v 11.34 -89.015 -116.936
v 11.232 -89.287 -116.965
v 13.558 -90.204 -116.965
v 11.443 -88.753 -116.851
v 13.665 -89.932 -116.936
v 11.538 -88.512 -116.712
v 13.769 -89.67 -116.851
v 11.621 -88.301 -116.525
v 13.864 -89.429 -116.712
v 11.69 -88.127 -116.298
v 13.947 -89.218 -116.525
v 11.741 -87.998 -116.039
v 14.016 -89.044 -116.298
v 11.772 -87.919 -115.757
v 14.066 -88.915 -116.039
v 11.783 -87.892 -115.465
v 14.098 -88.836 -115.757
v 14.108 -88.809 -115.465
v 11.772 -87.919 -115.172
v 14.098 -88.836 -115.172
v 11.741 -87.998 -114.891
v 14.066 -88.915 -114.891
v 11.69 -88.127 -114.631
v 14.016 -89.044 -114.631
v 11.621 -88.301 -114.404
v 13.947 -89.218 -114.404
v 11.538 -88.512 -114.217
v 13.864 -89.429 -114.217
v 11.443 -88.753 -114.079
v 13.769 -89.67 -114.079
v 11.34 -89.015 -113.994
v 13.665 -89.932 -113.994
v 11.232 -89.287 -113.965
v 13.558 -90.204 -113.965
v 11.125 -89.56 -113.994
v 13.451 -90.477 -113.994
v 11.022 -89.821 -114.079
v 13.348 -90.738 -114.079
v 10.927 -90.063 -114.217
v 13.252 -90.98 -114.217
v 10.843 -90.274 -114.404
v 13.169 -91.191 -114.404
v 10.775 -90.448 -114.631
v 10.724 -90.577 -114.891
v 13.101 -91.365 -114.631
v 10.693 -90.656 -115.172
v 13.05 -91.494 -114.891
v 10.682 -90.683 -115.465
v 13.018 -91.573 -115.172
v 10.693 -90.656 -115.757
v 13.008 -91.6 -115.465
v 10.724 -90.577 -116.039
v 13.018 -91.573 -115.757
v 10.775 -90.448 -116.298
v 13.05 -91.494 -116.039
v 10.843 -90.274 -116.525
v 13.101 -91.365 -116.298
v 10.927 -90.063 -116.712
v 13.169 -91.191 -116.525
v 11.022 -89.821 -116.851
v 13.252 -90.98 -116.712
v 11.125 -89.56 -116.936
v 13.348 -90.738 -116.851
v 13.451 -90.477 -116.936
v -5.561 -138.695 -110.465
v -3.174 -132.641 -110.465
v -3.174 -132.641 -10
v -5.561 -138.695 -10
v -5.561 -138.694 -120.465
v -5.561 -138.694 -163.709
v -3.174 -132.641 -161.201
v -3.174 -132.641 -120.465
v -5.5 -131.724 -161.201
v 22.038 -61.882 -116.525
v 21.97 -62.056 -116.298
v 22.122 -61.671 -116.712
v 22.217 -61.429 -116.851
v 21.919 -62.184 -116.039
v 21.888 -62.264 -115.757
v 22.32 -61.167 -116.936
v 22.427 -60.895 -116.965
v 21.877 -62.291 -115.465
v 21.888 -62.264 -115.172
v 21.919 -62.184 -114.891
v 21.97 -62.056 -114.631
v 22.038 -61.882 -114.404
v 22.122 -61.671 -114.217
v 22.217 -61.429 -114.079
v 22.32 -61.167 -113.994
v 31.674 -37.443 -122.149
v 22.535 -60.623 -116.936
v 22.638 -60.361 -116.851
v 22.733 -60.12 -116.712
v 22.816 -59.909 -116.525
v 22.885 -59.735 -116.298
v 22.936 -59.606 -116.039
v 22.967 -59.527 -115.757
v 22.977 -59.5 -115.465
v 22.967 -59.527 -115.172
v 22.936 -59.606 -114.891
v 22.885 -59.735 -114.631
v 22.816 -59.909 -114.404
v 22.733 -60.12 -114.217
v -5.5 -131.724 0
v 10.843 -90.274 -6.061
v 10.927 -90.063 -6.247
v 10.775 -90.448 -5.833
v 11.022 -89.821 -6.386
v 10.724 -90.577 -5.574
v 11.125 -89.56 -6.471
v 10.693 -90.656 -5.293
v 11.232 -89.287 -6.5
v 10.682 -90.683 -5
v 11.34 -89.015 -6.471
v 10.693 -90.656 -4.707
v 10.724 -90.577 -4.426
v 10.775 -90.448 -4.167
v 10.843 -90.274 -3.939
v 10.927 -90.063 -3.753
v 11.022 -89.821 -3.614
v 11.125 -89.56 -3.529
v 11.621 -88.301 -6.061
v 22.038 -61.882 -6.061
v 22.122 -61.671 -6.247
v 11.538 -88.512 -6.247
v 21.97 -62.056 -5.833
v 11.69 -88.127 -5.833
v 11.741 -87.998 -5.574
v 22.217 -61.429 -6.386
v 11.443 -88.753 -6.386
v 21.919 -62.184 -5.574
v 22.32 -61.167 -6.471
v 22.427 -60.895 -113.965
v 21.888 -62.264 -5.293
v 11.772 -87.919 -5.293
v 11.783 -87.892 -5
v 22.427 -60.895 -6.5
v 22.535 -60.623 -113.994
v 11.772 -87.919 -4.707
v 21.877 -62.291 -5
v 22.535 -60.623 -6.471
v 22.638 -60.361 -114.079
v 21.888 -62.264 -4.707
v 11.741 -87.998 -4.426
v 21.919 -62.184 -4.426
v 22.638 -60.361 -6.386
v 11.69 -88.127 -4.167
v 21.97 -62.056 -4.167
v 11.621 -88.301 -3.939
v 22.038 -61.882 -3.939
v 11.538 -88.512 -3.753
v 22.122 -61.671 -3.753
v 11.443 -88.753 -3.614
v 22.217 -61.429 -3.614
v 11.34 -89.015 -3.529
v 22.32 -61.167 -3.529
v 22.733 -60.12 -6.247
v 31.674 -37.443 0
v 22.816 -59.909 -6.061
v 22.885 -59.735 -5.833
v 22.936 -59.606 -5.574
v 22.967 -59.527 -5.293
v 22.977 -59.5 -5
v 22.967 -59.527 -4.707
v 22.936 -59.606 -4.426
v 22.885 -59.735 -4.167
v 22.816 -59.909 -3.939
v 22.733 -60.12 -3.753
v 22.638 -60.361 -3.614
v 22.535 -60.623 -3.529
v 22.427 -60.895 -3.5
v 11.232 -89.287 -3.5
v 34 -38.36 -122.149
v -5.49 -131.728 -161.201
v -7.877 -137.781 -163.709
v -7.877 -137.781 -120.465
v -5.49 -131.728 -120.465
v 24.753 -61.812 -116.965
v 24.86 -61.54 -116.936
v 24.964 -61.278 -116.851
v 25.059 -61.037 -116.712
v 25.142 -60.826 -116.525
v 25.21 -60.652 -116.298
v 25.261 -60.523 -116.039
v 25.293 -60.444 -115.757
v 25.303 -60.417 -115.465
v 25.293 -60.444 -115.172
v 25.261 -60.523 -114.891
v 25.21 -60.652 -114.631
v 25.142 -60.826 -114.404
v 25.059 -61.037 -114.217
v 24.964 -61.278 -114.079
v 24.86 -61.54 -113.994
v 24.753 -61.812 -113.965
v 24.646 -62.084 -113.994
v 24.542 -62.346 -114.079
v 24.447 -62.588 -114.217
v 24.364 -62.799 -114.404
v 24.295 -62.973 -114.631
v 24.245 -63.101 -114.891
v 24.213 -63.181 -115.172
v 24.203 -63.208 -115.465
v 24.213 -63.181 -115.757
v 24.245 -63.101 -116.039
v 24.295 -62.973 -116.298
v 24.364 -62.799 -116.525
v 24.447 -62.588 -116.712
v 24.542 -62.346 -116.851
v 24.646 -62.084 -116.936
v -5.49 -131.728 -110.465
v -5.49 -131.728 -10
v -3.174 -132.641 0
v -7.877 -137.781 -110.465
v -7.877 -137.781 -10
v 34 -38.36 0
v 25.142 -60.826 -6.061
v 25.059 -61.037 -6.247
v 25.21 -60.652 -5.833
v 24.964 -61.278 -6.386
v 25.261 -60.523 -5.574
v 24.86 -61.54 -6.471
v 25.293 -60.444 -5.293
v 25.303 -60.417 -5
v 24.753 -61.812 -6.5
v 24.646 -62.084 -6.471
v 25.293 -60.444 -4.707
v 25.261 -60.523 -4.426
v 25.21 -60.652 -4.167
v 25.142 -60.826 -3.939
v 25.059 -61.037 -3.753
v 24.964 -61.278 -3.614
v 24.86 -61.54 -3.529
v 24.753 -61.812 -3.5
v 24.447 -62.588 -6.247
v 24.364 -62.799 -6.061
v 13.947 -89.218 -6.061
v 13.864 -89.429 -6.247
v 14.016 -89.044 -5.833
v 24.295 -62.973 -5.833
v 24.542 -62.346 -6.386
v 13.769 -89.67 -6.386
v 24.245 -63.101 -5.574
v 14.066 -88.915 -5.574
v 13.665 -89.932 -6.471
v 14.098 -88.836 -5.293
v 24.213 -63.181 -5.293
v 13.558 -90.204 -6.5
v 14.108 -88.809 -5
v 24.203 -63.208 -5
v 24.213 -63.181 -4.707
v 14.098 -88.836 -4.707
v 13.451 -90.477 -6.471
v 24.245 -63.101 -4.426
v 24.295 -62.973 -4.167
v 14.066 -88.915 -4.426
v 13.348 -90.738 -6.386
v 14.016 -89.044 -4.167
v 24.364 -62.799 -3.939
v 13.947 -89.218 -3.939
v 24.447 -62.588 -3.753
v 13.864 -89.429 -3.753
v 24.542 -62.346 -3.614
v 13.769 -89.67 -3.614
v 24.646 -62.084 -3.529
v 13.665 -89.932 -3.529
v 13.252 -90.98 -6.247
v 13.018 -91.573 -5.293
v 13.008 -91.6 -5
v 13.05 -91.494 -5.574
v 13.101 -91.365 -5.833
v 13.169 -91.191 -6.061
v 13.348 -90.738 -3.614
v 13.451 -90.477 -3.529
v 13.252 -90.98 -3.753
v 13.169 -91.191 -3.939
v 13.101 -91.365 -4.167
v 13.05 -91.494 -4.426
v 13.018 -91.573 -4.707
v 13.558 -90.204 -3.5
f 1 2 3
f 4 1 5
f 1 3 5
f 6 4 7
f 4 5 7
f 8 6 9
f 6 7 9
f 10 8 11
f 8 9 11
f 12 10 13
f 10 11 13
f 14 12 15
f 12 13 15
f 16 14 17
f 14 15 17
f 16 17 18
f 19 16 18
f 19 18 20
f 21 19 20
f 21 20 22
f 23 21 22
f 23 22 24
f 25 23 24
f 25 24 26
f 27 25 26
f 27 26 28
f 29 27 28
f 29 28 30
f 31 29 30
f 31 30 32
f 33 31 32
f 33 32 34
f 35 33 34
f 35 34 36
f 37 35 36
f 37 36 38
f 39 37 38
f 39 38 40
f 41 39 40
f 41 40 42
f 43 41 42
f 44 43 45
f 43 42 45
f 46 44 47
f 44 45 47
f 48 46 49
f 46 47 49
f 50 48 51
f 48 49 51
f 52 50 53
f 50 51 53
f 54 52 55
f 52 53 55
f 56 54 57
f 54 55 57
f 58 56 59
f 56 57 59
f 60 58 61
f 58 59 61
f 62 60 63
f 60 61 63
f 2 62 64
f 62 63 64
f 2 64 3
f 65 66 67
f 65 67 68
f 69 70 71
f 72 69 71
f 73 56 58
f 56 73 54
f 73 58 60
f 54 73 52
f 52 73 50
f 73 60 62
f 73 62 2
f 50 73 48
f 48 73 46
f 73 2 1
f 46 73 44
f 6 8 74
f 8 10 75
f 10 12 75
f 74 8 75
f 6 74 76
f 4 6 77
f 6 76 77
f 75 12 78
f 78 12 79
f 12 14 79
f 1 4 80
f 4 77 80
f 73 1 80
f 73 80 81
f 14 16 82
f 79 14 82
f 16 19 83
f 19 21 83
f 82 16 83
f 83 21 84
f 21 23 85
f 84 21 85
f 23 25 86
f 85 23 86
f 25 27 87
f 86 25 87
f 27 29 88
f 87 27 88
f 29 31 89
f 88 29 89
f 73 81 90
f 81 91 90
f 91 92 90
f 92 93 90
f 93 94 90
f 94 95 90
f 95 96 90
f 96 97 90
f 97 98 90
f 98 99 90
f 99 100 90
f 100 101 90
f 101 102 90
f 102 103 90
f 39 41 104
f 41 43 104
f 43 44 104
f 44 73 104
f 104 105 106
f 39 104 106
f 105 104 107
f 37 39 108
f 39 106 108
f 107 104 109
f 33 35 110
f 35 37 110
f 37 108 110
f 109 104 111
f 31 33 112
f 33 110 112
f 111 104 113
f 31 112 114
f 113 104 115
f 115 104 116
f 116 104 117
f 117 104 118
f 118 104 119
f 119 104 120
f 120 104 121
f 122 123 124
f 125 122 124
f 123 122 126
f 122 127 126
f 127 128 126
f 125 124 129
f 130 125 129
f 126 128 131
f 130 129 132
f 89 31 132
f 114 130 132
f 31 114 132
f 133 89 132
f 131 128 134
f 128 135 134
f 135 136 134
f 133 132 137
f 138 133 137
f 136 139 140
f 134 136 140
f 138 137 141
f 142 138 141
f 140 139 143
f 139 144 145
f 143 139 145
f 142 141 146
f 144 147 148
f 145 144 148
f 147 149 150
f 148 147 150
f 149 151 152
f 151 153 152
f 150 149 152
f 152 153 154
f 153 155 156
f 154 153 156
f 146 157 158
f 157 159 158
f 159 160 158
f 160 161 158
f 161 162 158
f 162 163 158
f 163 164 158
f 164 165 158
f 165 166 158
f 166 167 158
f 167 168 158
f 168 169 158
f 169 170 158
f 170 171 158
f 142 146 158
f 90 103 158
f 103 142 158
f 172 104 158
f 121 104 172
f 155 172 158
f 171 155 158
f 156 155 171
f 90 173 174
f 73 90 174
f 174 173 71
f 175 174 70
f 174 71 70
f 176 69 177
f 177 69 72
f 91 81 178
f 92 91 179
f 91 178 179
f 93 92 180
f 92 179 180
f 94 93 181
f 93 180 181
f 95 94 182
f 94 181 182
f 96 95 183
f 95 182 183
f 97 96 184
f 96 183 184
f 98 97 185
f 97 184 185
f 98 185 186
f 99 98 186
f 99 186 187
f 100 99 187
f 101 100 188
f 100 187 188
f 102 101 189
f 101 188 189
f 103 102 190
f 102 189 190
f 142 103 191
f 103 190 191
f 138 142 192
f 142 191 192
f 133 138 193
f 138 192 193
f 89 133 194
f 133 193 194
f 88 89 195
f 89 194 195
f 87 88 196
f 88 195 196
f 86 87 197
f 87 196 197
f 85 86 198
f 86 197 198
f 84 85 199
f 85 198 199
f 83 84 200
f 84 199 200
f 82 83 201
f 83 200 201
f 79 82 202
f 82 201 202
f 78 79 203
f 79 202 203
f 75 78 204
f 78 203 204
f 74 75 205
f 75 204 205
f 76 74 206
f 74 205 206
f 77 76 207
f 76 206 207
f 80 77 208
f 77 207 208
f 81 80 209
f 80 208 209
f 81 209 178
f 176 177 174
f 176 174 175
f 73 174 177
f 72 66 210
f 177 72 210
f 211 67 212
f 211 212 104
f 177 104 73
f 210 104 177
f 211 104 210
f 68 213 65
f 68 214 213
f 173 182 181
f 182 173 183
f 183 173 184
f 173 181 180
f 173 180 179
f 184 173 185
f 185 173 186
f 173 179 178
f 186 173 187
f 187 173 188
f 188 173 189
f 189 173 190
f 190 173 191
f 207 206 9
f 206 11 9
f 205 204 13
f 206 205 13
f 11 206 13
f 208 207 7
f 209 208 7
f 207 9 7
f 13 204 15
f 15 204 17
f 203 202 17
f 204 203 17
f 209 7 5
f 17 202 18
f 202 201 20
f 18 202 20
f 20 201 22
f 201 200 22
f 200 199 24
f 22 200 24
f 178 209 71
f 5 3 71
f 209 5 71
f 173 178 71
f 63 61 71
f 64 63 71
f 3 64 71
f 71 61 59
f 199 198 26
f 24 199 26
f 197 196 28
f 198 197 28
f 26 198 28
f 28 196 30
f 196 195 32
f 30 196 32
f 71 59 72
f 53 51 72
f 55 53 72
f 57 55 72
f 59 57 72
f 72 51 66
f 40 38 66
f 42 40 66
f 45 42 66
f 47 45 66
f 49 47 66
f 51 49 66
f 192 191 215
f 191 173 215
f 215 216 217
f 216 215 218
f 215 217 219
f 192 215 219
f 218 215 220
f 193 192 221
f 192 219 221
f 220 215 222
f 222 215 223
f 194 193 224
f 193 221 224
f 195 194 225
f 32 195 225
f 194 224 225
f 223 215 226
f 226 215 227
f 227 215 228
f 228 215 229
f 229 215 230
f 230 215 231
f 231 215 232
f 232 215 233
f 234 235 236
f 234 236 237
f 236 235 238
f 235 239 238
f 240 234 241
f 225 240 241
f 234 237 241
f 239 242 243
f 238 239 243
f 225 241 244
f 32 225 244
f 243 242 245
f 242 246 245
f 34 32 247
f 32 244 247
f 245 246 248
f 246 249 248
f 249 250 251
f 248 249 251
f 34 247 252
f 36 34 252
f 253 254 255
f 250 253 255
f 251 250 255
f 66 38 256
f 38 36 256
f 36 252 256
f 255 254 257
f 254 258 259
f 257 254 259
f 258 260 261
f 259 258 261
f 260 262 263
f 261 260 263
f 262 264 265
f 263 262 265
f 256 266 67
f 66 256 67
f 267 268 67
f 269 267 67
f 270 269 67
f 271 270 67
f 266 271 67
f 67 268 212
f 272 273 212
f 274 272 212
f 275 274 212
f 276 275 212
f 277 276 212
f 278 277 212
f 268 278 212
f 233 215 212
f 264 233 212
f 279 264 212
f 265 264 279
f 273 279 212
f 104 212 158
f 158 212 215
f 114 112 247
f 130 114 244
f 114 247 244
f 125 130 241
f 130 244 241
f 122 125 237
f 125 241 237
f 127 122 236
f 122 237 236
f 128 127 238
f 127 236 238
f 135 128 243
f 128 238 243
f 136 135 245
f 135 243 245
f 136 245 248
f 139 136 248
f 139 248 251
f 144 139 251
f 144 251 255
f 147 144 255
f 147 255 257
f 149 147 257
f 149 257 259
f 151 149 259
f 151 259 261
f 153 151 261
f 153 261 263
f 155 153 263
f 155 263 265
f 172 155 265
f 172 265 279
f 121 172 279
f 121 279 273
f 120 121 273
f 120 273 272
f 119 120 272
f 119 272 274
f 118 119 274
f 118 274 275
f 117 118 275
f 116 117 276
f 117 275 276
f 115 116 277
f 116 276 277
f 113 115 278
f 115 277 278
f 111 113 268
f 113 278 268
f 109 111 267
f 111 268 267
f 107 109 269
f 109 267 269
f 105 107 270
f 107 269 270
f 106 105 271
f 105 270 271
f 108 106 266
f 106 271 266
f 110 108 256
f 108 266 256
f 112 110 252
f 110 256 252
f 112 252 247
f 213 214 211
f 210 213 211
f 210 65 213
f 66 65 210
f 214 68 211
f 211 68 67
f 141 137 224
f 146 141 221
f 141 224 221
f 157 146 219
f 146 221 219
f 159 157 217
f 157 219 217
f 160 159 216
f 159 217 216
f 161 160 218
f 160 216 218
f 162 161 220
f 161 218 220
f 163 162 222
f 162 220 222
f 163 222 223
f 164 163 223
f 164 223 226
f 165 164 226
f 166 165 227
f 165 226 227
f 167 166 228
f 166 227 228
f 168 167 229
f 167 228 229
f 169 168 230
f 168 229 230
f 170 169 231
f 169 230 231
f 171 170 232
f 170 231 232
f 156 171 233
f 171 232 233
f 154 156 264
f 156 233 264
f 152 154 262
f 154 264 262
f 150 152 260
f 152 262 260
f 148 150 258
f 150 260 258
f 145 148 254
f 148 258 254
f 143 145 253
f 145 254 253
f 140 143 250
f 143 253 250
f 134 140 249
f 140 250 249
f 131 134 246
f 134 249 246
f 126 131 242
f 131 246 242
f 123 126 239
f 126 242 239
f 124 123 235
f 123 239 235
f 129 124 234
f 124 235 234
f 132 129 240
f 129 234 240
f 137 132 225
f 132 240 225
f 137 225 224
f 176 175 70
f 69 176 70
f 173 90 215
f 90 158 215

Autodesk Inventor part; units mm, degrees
ref_plane "YZ Plane" through (0, 0, 0) normal (1, 0, 0) x (0, 1, 0)
ref_plane "作業平面1" through (14.25, -85.0419, 0) normal (0, 0, -1) x (0, 1, 0)
sketch "スケッチ1" plane through (14.25, -85.0419, 0) normal (0, 0, -1) x (0, 1, 0)
  line L0 (-46.6818, -19.75) -> (47.5988, 17.4243) projected
  line L1 (47.5988, 17.4243) -> (46.6818, 19.75) projected
  line L2 (46.6818, 19.75) -> (-47.5988, -17.4243) projected
  line L3 (-47.5988, -17.4243) -> (-46.6818, -19.75) projected
  point P0 (85.0419, -14.25)
ref_plane "作業平面2" through (-8.85, -128.1353, -159.8711) normal (0, 0.3826834, -0.9238795) x (0, 0.9238795, 0.3826834)
extrude "押し出し1" add sketch "スケッチ1" along normal up to surface surface through (-8.85, -128.1353, -159.8711) normal (0, 0.3826834, -0.9238795)
sketch "スケッチ2" plane through (-3.1743, -132.6408, 0) normal (0.930296, -0.3668097, 0) x (0, 0, -1)
  line L0 (0, 30.3562) -> (10, 30.3562) projected
  line L1 (0, 91.3953) -> (0, 30.3562) projected
  line L2 (10, 91.3953) -> (0, 91.3953) projected
  line L3 (10, 30.3562) -> (10, 91.3953) projected
  line L4 (110.4647, 30.3562) -> (120.4647, 30.3562) projected
  line L5 (110.4647, 91.3953) -> (110.4647, 30.3562) projected
  line L6 (120.4647, 91.3953) -> (110.4647, 91.3953) projected
  line L7 (120.4647, 30.3562) -> (120.4647, 91.3953) projected
  line L8 (110.4647, 30.3562) -> (120.4647, 30.3562) projected
  line L9 (110.4647, 91.3953) -> (110.4647, 30.3562) projected
  line L10 (120.4647, 91.3953) -> (110.4647, 91.3953) projected
  line L11 (120.4647, 30.3562) -> (120.4647, 91.3953) projected
  line L12 (0, 91.3953) -> (10, 91.3953)
  line L13 (10, 91.3953) -> (10, 60.8757)
  line L14 (10, 60.8757) -> (0, 60.8757)
  line L15 (0, 60.8757) -> (0, 91.3953)
  line L16 (10, 60.8757) -> (0, 60.8757)
  line L17 (0, 60.8757) -> (0, 30.3562)
  line L18 (0, 30.3562) -> (10, 30.3562)
  line L19 (10, 30.3562) -> (10, 60.8757)
  line L20 (110.4647, 91.3953) -> (120.4647, 91.3953)
  line L21 (120.4647, 91.3953) -> (120.4647, 60.8757)
  line L22 (120.4647, 60.8757) -> (110.4647, 60.8757)
  line L23 (110.4647, 60.8757) -> (110.4647, 91.3953)
  line L24 (120.4647, 60.8757) -> (110.4647, 60.8757)
  line L25 (110.4647, 60.8757) -> (110.4647, 30.3562)
  line L26 (110.4647, 30.3562) -> (120.4647, 30.3562)
  line L27 (120.4647, 30.3562) -> (120.4647, 60.8757)
  circle A0 centre (5, 45.616) radius 1.5
  circle A1 centre (5, 76.1355) radius 1.5
  circle A2 centre (115.4647, 76.1355) radius 1.5
  circle A3 centre (115.4647, 45.616) radius 1.5
  circle A4 centre (115.4647, 76.1355) radius 1.5 projected
  circle A5 centre (115.4647, 45.616) radius 1.5 projected
  circle A6 centre (5, 76.1355) radius 1.5 projected
  circle A7 centre (5, 45.616) radius 1.5 projected
  circle A8 centre (115.4647, 76.1355) radius 1.5 projected
  circle A9 centre (115.4647, 45.616) radius 1.5 projected
  point P0 (0, 124.5595)
  dimension "d2" = 3
  dimension "d3" = 3
  dimension "d4" = 3
  dimension "d5" = 3
extrude "押し出し2" cut sketch "スケッチ2" against normal blind 2.5 contours A0 | A1 | A2 | A3
ref_plane "作業平面3" through (13.1229, -86.9061, -10) normal (0, 0, -1) x (0, 1, 0)
sketch "スケッチ3" plane through (13.1229, -86.9061, -10) normal (0, 0, -1) x (0, 1, 0)
  line L0 (-44.8176, -18.6229) -> (-45.7346, -16.2971) projected
  line L1 (-50.8753, -21) -> (-51.7923, -18.6743)
  line L2 (-53.8577, -21) -> (53.8577, -21)
  line L3 (-45.423, -16.1743) -> (-53.8577, -19.5)
  line L4 (-51.7923, -18.6743) -> (-50.8753, -21)
  line L5 (-50.8753, -21) -> (-44.8215, -18.613)
  line L6 (-44.8215, -18.613) -> (-45.7385, -16.2873)
  line L7 (-45.7385, -16.2873) -> (-51.7923, -18.6743)
  point P0 (86.9061, -13.1229)
  point P1 (-51.7884, -18.6841)
ref_plane "作業平面4" through (-7.8771, -140.7638, -110.4647) normal (0, 0, 1) x (1, 0, 0)
extrude "押し出し3" add sketch "スケッチ3" along normal up to surface (100.4647 mm away) contours L5 L1 L3 L0
ref_plane "作業平面5" through (13.1229, -86.9061, -120.4647) normal (0, 0, -1) x (0, 1, 0)
sketch "スケッチ4" plane through (13.1229, -86.9061, -120.4647) normal (0, 0, -1) x (0, 1, 0)
  line L0 (-44.8176, -18.6229) -> (-45.7346, -16.2971) projected
  line L1 (-50.8753, -21) -> (-51.7923, -18.6743)
  line L2 (49.4342, 18.5514) -> (-50.8753, -21)
  line L3 (-51.7923, -18.6743) -> (48.5172, 20.8771)
  line L4 (-45.7346, -16.2971) -> (-44.8176, -18.6229)
  line L5 (-44.8176, -18.6229) -> (-50.8714, -21.0098)
  line L6 (-50.8714, -21.0098) -> (-51.7884, -18.6841)
  line L7 (-51.7884, -18.6841) -> (-45.7346, -16.2971)
  point P0 (86.9061, -13.1229)
  point P1 (-51.7884, -18.6841)
  point P2 (-44.8215, -18.613)
extrude "押し出し4" add sketch "スケッチ4" along normal up to surface contours L2 L1 L7 L0 surface through (14.25, -85.0419, -142.0212) normal (0, 0.3826834, -0.9238795)
sketch "スケッチ7" plane through (34, -38.3601, 0) normal (0.930296, -0.3668097, 0) x (0, 0, -1)
  circle A0 centre (5, -55.7288) radius 1.5 projected
  circle A1 centre (115.4647, -55.7288) radius 1.5 projected
  circle A2 centre (5, -25.2093) radius 1.5 projected
  circle A3 centre (115.4647, -25.2093) radius 1.5 projected
  line L0 (164.2448, -107.8521) -> (122.685, 0) projected
  line L1 (0, 0) -> (122.685, 0) projected
  line L2 (0, 0) -> (0, -101.3448) projected
  line L3 (0, -101.3448) -> (10, -101.3448) projected
  line L4 (10, -101.3448) -> (10, -107.8521) projected
  line L5 (10, -107.8521) -> (110.4647, -107.8521) projected
  line L6 (110.4647, -101.3448) -> (110.4647, -107.8521) projected
  line L7 (110.4647, -101.3448) -> (120.4647, -101.3448) projected
  line L8 (120.4647, -101.3448) -> (120.4647, -107.8521) projected
  line L9 (120.4647, -107.8521) -> (164.2448, -107.8521) projected
  line L10 (122.1491, 0) -> (163.709, -107.8521)
  line L11 (164.2448, -107.8521) -> (122.685, 0) projected
  point P0 (0, 23.2147)
  dimension "d13" = 0.5
extrude "押し出し5" cut sketch "スケッチ7" against normal blind 2.5 contours L9 L10 L1 L0
properties part number "lefft_wall" material "木材 (カエデ材)"
